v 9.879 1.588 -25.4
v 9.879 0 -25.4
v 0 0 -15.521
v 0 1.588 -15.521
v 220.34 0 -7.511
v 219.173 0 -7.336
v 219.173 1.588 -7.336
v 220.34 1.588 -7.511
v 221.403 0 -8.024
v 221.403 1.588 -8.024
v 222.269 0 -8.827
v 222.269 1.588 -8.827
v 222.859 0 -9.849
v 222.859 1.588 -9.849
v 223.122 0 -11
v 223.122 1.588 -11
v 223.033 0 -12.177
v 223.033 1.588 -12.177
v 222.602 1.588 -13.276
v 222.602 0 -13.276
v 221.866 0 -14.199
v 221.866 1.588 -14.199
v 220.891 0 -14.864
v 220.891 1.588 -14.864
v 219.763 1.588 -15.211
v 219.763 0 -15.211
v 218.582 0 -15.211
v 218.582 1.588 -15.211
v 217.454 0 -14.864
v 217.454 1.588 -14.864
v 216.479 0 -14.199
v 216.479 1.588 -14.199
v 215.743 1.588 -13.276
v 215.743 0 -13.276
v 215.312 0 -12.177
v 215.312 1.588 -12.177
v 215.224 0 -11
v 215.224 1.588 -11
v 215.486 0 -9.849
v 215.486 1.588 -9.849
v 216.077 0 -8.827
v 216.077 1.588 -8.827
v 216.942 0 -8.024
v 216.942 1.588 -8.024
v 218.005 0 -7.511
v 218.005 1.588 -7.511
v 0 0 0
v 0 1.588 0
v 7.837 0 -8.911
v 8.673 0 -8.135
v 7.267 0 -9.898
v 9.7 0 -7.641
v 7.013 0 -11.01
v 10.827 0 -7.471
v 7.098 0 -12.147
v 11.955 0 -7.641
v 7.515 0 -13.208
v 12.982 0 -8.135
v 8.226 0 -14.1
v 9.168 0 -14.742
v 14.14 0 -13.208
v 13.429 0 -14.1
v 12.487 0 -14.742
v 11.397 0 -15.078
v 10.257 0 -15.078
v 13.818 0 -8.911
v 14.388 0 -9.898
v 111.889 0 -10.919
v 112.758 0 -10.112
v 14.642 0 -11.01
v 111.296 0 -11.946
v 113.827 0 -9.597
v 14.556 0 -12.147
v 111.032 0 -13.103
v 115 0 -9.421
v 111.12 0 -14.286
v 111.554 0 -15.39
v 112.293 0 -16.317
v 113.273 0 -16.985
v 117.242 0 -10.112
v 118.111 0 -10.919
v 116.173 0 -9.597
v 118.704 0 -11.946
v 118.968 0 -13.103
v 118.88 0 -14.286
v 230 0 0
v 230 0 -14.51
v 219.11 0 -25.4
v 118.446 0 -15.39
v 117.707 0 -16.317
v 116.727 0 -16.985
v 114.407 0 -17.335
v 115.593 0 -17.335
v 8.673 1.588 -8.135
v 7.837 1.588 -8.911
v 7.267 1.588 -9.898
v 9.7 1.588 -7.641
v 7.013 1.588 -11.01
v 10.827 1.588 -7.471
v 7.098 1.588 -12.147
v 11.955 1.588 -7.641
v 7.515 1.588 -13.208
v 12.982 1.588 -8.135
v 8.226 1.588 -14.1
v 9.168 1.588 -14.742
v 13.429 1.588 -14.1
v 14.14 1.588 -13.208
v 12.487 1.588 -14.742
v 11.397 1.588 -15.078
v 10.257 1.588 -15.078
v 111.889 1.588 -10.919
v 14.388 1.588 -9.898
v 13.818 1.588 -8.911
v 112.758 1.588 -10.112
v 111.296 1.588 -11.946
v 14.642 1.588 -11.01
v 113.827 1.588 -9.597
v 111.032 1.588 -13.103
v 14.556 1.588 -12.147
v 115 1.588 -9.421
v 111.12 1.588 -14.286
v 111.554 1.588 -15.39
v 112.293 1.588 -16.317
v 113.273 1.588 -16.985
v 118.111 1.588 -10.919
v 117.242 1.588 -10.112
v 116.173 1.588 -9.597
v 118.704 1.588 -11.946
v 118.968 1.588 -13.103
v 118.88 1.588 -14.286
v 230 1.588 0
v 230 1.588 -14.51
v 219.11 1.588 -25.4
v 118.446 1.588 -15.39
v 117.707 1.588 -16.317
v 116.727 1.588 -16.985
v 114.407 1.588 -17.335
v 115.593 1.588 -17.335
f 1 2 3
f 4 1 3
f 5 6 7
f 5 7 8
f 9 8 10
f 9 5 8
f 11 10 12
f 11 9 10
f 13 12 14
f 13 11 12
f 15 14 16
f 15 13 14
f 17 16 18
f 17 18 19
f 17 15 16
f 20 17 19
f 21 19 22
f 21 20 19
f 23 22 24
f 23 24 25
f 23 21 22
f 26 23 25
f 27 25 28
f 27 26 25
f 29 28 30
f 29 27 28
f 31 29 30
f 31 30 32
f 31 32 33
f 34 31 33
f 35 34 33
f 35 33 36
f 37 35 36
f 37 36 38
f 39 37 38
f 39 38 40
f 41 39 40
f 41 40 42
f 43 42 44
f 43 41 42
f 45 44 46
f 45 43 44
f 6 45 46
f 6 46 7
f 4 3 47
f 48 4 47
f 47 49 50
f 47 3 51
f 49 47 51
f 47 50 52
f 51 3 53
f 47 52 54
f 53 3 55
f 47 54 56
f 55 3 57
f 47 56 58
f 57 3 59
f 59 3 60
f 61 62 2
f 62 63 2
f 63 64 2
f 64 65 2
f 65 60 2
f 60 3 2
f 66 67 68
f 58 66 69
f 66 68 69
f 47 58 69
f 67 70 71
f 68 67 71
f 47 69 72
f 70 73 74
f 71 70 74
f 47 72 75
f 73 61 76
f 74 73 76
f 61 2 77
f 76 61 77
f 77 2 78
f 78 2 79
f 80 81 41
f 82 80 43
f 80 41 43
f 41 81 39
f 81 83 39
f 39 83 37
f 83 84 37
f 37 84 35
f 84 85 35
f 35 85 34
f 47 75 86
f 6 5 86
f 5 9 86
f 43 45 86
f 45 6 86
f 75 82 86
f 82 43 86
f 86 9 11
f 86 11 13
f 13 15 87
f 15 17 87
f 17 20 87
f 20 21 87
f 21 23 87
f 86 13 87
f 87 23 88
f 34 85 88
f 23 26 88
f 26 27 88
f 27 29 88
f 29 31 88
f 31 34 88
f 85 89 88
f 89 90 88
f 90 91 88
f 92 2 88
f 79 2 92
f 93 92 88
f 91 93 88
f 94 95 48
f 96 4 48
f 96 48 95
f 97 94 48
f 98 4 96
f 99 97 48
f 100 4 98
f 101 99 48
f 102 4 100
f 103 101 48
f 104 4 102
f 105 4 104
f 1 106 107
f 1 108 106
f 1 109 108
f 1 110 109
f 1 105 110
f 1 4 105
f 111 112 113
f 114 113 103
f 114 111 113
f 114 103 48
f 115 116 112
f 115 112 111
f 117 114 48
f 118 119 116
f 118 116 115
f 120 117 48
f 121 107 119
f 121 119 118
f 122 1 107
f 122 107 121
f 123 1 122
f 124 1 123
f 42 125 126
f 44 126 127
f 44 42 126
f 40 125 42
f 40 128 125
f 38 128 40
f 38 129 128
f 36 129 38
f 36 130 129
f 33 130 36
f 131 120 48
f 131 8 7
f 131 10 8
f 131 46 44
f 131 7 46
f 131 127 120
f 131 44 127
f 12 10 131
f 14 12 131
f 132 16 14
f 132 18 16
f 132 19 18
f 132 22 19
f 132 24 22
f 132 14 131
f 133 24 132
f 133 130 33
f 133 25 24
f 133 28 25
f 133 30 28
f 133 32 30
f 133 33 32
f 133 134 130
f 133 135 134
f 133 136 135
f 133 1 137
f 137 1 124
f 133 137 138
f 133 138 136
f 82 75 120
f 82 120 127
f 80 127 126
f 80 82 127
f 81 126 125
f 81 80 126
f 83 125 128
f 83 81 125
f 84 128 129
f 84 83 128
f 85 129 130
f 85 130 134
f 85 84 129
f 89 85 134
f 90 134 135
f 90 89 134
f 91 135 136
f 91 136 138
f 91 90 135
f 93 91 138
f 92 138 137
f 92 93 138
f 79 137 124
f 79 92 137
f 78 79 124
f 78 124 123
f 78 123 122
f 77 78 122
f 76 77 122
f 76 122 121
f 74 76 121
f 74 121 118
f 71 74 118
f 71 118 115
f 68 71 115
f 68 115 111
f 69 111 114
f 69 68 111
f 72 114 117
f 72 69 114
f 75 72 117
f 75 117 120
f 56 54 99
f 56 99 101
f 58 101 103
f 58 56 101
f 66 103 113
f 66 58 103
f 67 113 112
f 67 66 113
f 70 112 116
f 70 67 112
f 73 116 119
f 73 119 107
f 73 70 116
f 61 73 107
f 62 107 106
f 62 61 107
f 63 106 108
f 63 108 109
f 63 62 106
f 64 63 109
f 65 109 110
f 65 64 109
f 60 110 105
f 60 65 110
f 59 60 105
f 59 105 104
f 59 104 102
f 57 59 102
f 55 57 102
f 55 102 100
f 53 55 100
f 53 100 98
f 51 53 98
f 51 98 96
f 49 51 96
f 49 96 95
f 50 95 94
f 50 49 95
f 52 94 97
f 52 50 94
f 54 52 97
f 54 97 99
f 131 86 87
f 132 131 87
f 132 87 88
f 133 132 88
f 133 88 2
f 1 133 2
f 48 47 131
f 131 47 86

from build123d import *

# Parameters (mm, degrees)
SKETCH1_R           = 3.824987574
SKETCH1_R_2         = 3.960069723
SKETCH1_R_3         = 3.979490197
BOSS_EXTRUDE1_DEPTH = 1.5875


with BuildPart() as part:
    # Sketch1 → Boss-Extrude1 (new body)
    with BuildSketch(Plane(origin=(0, 0, 0), x_dir=(1, 0, 0), z_dir=(0, 1, 0))):
        Polygon((9.878524394, 25.4), (0, 15.521475606), (0, 0), (230, 0), (230, 14.509954572), (219.109954572, 25.4), align=None)
        with Locations(Location((10.82729629, 11.29561028, 0), (0, 0, 270))):
            Circle(SKETCH1_R, mode=Mode.SUBTRACT)
        with Locations(Location((219.17270371, 11.29561028, 0), (0, 0, 270))):
            Circle(SKETCH1_R_2, mode=Mode.SUBTRACT)
        with Locations(Location((115, 13.4, 0), (0, 0, 270))):
            Circle(SKETCH1_R_3, mode=Mode.SUBTRACT)
    extrude(amount=BOSS_EXTRUDE1_DEPTH)


solid = part.part
